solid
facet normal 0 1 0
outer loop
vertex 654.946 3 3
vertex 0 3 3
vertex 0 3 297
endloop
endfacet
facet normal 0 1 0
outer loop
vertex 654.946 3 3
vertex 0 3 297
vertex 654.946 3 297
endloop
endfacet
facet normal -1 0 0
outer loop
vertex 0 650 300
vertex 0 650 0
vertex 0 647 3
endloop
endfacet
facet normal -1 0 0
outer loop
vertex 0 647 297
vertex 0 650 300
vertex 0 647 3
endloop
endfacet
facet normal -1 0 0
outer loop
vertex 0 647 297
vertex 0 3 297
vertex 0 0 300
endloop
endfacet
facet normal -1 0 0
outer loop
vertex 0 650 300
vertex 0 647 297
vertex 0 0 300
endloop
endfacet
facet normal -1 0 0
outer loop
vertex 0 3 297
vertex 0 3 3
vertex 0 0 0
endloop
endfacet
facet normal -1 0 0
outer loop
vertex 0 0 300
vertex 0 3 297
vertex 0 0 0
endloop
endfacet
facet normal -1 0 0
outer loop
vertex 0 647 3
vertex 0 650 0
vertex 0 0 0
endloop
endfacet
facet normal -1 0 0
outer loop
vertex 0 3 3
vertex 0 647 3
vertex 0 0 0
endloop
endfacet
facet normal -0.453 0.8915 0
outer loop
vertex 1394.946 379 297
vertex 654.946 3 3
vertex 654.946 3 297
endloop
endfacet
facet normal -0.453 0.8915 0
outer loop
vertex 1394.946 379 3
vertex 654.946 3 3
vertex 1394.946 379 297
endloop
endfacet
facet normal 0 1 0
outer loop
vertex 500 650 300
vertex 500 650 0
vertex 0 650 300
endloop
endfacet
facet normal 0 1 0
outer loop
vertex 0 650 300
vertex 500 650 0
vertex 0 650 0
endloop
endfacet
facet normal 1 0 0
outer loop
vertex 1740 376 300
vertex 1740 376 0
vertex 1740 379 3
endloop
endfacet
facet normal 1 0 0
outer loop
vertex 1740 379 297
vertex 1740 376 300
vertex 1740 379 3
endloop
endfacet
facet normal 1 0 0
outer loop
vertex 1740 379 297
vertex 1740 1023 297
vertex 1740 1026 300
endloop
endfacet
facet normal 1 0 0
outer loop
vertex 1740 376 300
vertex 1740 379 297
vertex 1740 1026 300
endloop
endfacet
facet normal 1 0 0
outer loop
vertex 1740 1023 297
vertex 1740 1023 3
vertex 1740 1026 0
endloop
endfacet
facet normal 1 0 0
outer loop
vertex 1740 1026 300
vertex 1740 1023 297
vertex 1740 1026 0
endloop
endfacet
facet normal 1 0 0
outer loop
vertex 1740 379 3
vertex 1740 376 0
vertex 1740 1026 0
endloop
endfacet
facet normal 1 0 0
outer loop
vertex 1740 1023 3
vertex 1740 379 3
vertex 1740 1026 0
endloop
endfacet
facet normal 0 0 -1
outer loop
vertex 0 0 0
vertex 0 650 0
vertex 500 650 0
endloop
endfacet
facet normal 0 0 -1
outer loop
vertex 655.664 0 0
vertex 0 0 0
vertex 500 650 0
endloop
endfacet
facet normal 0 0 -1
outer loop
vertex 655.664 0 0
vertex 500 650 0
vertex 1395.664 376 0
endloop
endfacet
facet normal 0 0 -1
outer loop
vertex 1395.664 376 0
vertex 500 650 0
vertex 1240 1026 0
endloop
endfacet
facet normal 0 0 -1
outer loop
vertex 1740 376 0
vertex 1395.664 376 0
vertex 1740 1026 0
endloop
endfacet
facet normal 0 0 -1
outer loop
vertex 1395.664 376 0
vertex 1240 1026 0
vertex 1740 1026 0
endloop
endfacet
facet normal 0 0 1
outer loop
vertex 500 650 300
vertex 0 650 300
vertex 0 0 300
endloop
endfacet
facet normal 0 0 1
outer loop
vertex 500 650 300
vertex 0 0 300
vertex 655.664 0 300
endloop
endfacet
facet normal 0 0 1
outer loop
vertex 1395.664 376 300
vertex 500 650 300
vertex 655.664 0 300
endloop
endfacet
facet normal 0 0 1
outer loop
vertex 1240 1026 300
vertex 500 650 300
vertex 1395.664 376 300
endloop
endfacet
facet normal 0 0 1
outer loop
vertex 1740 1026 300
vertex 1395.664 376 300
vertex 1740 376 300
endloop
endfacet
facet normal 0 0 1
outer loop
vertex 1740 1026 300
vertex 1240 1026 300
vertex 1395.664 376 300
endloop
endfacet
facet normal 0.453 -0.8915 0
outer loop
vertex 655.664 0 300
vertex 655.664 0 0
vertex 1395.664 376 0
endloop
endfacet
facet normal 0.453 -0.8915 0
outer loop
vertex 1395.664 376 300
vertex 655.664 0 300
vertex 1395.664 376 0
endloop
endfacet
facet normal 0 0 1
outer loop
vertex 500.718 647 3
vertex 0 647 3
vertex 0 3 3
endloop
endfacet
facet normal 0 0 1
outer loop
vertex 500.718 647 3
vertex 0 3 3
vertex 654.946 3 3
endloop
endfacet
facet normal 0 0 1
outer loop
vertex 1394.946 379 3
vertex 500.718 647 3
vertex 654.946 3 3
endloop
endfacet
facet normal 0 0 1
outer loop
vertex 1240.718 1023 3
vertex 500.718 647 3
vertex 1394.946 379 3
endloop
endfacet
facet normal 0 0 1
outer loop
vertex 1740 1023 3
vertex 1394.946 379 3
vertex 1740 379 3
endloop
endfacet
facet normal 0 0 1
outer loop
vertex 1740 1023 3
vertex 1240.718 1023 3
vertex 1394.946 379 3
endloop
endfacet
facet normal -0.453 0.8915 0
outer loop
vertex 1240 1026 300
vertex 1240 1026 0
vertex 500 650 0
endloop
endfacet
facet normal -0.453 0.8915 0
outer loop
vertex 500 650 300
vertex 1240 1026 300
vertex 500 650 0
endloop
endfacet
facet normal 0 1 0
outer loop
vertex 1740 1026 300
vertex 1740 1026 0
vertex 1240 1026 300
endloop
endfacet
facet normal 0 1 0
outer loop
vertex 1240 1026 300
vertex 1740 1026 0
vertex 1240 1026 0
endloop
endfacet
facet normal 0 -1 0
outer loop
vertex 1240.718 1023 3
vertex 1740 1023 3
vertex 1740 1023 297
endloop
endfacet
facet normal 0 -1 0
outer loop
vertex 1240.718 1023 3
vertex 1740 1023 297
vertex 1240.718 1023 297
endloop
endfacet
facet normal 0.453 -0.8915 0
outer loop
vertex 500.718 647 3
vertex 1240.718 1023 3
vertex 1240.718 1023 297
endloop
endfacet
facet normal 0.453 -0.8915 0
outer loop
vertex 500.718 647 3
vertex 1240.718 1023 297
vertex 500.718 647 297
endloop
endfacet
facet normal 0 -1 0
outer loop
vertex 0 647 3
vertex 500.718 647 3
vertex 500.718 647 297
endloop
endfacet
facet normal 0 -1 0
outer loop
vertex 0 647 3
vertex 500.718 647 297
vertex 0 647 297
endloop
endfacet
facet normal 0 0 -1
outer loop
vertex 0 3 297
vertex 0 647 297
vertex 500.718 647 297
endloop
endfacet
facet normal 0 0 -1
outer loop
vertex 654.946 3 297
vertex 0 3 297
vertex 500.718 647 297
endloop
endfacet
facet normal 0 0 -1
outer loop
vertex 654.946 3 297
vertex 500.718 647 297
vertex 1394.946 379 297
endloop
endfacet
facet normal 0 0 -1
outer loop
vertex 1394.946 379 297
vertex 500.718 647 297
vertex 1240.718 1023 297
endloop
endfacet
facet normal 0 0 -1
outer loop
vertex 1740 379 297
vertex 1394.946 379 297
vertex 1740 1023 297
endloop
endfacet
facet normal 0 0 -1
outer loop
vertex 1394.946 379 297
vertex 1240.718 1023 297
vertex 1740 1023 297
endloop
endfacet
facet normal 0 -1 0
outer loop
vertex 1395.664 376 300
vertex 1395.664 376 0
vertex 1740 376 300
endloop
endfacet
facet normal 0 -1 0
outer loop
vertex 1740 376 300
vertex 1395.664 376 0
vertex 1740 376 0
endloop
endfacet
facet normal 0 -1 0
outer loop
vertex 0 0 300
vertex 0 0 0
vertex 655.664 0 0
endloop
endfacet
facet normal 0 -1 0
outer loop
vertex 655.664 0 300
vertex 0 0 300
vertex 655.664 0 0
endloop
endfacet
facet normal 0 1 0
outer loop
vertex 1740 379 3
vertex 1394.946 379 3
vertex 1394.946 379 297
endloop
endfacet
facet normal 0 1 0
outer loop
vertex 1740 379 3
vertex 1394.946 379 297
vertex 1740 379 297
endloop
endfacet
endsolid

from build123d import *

# Parameters (mm, degrees)
F1_DEPTH = 300
F2_T     = -3


with BuildPart() as f1:
    # F0 (on Top) → F1 (new body)
    with BuildSketch(Plane.XY):
        Polygon((0, 650), (0, 0), (655.664250573, 0), (1395.664250573, 376), (1740, 376), (1740, 1026), (1240, 1026), (500, 650), align=None)
    extrude(amount=F1_DEPTH)

    # F2
    f2_openings = [f1.faces().sort_by_distance(p)[0] for p in [
        (0, 325, 150),
        (1740, 701, 150),
    ]]
    offset(amount=F2_T, openings=f2_openings, kind=Kind.INTERSECTION)


solid = f1.part
